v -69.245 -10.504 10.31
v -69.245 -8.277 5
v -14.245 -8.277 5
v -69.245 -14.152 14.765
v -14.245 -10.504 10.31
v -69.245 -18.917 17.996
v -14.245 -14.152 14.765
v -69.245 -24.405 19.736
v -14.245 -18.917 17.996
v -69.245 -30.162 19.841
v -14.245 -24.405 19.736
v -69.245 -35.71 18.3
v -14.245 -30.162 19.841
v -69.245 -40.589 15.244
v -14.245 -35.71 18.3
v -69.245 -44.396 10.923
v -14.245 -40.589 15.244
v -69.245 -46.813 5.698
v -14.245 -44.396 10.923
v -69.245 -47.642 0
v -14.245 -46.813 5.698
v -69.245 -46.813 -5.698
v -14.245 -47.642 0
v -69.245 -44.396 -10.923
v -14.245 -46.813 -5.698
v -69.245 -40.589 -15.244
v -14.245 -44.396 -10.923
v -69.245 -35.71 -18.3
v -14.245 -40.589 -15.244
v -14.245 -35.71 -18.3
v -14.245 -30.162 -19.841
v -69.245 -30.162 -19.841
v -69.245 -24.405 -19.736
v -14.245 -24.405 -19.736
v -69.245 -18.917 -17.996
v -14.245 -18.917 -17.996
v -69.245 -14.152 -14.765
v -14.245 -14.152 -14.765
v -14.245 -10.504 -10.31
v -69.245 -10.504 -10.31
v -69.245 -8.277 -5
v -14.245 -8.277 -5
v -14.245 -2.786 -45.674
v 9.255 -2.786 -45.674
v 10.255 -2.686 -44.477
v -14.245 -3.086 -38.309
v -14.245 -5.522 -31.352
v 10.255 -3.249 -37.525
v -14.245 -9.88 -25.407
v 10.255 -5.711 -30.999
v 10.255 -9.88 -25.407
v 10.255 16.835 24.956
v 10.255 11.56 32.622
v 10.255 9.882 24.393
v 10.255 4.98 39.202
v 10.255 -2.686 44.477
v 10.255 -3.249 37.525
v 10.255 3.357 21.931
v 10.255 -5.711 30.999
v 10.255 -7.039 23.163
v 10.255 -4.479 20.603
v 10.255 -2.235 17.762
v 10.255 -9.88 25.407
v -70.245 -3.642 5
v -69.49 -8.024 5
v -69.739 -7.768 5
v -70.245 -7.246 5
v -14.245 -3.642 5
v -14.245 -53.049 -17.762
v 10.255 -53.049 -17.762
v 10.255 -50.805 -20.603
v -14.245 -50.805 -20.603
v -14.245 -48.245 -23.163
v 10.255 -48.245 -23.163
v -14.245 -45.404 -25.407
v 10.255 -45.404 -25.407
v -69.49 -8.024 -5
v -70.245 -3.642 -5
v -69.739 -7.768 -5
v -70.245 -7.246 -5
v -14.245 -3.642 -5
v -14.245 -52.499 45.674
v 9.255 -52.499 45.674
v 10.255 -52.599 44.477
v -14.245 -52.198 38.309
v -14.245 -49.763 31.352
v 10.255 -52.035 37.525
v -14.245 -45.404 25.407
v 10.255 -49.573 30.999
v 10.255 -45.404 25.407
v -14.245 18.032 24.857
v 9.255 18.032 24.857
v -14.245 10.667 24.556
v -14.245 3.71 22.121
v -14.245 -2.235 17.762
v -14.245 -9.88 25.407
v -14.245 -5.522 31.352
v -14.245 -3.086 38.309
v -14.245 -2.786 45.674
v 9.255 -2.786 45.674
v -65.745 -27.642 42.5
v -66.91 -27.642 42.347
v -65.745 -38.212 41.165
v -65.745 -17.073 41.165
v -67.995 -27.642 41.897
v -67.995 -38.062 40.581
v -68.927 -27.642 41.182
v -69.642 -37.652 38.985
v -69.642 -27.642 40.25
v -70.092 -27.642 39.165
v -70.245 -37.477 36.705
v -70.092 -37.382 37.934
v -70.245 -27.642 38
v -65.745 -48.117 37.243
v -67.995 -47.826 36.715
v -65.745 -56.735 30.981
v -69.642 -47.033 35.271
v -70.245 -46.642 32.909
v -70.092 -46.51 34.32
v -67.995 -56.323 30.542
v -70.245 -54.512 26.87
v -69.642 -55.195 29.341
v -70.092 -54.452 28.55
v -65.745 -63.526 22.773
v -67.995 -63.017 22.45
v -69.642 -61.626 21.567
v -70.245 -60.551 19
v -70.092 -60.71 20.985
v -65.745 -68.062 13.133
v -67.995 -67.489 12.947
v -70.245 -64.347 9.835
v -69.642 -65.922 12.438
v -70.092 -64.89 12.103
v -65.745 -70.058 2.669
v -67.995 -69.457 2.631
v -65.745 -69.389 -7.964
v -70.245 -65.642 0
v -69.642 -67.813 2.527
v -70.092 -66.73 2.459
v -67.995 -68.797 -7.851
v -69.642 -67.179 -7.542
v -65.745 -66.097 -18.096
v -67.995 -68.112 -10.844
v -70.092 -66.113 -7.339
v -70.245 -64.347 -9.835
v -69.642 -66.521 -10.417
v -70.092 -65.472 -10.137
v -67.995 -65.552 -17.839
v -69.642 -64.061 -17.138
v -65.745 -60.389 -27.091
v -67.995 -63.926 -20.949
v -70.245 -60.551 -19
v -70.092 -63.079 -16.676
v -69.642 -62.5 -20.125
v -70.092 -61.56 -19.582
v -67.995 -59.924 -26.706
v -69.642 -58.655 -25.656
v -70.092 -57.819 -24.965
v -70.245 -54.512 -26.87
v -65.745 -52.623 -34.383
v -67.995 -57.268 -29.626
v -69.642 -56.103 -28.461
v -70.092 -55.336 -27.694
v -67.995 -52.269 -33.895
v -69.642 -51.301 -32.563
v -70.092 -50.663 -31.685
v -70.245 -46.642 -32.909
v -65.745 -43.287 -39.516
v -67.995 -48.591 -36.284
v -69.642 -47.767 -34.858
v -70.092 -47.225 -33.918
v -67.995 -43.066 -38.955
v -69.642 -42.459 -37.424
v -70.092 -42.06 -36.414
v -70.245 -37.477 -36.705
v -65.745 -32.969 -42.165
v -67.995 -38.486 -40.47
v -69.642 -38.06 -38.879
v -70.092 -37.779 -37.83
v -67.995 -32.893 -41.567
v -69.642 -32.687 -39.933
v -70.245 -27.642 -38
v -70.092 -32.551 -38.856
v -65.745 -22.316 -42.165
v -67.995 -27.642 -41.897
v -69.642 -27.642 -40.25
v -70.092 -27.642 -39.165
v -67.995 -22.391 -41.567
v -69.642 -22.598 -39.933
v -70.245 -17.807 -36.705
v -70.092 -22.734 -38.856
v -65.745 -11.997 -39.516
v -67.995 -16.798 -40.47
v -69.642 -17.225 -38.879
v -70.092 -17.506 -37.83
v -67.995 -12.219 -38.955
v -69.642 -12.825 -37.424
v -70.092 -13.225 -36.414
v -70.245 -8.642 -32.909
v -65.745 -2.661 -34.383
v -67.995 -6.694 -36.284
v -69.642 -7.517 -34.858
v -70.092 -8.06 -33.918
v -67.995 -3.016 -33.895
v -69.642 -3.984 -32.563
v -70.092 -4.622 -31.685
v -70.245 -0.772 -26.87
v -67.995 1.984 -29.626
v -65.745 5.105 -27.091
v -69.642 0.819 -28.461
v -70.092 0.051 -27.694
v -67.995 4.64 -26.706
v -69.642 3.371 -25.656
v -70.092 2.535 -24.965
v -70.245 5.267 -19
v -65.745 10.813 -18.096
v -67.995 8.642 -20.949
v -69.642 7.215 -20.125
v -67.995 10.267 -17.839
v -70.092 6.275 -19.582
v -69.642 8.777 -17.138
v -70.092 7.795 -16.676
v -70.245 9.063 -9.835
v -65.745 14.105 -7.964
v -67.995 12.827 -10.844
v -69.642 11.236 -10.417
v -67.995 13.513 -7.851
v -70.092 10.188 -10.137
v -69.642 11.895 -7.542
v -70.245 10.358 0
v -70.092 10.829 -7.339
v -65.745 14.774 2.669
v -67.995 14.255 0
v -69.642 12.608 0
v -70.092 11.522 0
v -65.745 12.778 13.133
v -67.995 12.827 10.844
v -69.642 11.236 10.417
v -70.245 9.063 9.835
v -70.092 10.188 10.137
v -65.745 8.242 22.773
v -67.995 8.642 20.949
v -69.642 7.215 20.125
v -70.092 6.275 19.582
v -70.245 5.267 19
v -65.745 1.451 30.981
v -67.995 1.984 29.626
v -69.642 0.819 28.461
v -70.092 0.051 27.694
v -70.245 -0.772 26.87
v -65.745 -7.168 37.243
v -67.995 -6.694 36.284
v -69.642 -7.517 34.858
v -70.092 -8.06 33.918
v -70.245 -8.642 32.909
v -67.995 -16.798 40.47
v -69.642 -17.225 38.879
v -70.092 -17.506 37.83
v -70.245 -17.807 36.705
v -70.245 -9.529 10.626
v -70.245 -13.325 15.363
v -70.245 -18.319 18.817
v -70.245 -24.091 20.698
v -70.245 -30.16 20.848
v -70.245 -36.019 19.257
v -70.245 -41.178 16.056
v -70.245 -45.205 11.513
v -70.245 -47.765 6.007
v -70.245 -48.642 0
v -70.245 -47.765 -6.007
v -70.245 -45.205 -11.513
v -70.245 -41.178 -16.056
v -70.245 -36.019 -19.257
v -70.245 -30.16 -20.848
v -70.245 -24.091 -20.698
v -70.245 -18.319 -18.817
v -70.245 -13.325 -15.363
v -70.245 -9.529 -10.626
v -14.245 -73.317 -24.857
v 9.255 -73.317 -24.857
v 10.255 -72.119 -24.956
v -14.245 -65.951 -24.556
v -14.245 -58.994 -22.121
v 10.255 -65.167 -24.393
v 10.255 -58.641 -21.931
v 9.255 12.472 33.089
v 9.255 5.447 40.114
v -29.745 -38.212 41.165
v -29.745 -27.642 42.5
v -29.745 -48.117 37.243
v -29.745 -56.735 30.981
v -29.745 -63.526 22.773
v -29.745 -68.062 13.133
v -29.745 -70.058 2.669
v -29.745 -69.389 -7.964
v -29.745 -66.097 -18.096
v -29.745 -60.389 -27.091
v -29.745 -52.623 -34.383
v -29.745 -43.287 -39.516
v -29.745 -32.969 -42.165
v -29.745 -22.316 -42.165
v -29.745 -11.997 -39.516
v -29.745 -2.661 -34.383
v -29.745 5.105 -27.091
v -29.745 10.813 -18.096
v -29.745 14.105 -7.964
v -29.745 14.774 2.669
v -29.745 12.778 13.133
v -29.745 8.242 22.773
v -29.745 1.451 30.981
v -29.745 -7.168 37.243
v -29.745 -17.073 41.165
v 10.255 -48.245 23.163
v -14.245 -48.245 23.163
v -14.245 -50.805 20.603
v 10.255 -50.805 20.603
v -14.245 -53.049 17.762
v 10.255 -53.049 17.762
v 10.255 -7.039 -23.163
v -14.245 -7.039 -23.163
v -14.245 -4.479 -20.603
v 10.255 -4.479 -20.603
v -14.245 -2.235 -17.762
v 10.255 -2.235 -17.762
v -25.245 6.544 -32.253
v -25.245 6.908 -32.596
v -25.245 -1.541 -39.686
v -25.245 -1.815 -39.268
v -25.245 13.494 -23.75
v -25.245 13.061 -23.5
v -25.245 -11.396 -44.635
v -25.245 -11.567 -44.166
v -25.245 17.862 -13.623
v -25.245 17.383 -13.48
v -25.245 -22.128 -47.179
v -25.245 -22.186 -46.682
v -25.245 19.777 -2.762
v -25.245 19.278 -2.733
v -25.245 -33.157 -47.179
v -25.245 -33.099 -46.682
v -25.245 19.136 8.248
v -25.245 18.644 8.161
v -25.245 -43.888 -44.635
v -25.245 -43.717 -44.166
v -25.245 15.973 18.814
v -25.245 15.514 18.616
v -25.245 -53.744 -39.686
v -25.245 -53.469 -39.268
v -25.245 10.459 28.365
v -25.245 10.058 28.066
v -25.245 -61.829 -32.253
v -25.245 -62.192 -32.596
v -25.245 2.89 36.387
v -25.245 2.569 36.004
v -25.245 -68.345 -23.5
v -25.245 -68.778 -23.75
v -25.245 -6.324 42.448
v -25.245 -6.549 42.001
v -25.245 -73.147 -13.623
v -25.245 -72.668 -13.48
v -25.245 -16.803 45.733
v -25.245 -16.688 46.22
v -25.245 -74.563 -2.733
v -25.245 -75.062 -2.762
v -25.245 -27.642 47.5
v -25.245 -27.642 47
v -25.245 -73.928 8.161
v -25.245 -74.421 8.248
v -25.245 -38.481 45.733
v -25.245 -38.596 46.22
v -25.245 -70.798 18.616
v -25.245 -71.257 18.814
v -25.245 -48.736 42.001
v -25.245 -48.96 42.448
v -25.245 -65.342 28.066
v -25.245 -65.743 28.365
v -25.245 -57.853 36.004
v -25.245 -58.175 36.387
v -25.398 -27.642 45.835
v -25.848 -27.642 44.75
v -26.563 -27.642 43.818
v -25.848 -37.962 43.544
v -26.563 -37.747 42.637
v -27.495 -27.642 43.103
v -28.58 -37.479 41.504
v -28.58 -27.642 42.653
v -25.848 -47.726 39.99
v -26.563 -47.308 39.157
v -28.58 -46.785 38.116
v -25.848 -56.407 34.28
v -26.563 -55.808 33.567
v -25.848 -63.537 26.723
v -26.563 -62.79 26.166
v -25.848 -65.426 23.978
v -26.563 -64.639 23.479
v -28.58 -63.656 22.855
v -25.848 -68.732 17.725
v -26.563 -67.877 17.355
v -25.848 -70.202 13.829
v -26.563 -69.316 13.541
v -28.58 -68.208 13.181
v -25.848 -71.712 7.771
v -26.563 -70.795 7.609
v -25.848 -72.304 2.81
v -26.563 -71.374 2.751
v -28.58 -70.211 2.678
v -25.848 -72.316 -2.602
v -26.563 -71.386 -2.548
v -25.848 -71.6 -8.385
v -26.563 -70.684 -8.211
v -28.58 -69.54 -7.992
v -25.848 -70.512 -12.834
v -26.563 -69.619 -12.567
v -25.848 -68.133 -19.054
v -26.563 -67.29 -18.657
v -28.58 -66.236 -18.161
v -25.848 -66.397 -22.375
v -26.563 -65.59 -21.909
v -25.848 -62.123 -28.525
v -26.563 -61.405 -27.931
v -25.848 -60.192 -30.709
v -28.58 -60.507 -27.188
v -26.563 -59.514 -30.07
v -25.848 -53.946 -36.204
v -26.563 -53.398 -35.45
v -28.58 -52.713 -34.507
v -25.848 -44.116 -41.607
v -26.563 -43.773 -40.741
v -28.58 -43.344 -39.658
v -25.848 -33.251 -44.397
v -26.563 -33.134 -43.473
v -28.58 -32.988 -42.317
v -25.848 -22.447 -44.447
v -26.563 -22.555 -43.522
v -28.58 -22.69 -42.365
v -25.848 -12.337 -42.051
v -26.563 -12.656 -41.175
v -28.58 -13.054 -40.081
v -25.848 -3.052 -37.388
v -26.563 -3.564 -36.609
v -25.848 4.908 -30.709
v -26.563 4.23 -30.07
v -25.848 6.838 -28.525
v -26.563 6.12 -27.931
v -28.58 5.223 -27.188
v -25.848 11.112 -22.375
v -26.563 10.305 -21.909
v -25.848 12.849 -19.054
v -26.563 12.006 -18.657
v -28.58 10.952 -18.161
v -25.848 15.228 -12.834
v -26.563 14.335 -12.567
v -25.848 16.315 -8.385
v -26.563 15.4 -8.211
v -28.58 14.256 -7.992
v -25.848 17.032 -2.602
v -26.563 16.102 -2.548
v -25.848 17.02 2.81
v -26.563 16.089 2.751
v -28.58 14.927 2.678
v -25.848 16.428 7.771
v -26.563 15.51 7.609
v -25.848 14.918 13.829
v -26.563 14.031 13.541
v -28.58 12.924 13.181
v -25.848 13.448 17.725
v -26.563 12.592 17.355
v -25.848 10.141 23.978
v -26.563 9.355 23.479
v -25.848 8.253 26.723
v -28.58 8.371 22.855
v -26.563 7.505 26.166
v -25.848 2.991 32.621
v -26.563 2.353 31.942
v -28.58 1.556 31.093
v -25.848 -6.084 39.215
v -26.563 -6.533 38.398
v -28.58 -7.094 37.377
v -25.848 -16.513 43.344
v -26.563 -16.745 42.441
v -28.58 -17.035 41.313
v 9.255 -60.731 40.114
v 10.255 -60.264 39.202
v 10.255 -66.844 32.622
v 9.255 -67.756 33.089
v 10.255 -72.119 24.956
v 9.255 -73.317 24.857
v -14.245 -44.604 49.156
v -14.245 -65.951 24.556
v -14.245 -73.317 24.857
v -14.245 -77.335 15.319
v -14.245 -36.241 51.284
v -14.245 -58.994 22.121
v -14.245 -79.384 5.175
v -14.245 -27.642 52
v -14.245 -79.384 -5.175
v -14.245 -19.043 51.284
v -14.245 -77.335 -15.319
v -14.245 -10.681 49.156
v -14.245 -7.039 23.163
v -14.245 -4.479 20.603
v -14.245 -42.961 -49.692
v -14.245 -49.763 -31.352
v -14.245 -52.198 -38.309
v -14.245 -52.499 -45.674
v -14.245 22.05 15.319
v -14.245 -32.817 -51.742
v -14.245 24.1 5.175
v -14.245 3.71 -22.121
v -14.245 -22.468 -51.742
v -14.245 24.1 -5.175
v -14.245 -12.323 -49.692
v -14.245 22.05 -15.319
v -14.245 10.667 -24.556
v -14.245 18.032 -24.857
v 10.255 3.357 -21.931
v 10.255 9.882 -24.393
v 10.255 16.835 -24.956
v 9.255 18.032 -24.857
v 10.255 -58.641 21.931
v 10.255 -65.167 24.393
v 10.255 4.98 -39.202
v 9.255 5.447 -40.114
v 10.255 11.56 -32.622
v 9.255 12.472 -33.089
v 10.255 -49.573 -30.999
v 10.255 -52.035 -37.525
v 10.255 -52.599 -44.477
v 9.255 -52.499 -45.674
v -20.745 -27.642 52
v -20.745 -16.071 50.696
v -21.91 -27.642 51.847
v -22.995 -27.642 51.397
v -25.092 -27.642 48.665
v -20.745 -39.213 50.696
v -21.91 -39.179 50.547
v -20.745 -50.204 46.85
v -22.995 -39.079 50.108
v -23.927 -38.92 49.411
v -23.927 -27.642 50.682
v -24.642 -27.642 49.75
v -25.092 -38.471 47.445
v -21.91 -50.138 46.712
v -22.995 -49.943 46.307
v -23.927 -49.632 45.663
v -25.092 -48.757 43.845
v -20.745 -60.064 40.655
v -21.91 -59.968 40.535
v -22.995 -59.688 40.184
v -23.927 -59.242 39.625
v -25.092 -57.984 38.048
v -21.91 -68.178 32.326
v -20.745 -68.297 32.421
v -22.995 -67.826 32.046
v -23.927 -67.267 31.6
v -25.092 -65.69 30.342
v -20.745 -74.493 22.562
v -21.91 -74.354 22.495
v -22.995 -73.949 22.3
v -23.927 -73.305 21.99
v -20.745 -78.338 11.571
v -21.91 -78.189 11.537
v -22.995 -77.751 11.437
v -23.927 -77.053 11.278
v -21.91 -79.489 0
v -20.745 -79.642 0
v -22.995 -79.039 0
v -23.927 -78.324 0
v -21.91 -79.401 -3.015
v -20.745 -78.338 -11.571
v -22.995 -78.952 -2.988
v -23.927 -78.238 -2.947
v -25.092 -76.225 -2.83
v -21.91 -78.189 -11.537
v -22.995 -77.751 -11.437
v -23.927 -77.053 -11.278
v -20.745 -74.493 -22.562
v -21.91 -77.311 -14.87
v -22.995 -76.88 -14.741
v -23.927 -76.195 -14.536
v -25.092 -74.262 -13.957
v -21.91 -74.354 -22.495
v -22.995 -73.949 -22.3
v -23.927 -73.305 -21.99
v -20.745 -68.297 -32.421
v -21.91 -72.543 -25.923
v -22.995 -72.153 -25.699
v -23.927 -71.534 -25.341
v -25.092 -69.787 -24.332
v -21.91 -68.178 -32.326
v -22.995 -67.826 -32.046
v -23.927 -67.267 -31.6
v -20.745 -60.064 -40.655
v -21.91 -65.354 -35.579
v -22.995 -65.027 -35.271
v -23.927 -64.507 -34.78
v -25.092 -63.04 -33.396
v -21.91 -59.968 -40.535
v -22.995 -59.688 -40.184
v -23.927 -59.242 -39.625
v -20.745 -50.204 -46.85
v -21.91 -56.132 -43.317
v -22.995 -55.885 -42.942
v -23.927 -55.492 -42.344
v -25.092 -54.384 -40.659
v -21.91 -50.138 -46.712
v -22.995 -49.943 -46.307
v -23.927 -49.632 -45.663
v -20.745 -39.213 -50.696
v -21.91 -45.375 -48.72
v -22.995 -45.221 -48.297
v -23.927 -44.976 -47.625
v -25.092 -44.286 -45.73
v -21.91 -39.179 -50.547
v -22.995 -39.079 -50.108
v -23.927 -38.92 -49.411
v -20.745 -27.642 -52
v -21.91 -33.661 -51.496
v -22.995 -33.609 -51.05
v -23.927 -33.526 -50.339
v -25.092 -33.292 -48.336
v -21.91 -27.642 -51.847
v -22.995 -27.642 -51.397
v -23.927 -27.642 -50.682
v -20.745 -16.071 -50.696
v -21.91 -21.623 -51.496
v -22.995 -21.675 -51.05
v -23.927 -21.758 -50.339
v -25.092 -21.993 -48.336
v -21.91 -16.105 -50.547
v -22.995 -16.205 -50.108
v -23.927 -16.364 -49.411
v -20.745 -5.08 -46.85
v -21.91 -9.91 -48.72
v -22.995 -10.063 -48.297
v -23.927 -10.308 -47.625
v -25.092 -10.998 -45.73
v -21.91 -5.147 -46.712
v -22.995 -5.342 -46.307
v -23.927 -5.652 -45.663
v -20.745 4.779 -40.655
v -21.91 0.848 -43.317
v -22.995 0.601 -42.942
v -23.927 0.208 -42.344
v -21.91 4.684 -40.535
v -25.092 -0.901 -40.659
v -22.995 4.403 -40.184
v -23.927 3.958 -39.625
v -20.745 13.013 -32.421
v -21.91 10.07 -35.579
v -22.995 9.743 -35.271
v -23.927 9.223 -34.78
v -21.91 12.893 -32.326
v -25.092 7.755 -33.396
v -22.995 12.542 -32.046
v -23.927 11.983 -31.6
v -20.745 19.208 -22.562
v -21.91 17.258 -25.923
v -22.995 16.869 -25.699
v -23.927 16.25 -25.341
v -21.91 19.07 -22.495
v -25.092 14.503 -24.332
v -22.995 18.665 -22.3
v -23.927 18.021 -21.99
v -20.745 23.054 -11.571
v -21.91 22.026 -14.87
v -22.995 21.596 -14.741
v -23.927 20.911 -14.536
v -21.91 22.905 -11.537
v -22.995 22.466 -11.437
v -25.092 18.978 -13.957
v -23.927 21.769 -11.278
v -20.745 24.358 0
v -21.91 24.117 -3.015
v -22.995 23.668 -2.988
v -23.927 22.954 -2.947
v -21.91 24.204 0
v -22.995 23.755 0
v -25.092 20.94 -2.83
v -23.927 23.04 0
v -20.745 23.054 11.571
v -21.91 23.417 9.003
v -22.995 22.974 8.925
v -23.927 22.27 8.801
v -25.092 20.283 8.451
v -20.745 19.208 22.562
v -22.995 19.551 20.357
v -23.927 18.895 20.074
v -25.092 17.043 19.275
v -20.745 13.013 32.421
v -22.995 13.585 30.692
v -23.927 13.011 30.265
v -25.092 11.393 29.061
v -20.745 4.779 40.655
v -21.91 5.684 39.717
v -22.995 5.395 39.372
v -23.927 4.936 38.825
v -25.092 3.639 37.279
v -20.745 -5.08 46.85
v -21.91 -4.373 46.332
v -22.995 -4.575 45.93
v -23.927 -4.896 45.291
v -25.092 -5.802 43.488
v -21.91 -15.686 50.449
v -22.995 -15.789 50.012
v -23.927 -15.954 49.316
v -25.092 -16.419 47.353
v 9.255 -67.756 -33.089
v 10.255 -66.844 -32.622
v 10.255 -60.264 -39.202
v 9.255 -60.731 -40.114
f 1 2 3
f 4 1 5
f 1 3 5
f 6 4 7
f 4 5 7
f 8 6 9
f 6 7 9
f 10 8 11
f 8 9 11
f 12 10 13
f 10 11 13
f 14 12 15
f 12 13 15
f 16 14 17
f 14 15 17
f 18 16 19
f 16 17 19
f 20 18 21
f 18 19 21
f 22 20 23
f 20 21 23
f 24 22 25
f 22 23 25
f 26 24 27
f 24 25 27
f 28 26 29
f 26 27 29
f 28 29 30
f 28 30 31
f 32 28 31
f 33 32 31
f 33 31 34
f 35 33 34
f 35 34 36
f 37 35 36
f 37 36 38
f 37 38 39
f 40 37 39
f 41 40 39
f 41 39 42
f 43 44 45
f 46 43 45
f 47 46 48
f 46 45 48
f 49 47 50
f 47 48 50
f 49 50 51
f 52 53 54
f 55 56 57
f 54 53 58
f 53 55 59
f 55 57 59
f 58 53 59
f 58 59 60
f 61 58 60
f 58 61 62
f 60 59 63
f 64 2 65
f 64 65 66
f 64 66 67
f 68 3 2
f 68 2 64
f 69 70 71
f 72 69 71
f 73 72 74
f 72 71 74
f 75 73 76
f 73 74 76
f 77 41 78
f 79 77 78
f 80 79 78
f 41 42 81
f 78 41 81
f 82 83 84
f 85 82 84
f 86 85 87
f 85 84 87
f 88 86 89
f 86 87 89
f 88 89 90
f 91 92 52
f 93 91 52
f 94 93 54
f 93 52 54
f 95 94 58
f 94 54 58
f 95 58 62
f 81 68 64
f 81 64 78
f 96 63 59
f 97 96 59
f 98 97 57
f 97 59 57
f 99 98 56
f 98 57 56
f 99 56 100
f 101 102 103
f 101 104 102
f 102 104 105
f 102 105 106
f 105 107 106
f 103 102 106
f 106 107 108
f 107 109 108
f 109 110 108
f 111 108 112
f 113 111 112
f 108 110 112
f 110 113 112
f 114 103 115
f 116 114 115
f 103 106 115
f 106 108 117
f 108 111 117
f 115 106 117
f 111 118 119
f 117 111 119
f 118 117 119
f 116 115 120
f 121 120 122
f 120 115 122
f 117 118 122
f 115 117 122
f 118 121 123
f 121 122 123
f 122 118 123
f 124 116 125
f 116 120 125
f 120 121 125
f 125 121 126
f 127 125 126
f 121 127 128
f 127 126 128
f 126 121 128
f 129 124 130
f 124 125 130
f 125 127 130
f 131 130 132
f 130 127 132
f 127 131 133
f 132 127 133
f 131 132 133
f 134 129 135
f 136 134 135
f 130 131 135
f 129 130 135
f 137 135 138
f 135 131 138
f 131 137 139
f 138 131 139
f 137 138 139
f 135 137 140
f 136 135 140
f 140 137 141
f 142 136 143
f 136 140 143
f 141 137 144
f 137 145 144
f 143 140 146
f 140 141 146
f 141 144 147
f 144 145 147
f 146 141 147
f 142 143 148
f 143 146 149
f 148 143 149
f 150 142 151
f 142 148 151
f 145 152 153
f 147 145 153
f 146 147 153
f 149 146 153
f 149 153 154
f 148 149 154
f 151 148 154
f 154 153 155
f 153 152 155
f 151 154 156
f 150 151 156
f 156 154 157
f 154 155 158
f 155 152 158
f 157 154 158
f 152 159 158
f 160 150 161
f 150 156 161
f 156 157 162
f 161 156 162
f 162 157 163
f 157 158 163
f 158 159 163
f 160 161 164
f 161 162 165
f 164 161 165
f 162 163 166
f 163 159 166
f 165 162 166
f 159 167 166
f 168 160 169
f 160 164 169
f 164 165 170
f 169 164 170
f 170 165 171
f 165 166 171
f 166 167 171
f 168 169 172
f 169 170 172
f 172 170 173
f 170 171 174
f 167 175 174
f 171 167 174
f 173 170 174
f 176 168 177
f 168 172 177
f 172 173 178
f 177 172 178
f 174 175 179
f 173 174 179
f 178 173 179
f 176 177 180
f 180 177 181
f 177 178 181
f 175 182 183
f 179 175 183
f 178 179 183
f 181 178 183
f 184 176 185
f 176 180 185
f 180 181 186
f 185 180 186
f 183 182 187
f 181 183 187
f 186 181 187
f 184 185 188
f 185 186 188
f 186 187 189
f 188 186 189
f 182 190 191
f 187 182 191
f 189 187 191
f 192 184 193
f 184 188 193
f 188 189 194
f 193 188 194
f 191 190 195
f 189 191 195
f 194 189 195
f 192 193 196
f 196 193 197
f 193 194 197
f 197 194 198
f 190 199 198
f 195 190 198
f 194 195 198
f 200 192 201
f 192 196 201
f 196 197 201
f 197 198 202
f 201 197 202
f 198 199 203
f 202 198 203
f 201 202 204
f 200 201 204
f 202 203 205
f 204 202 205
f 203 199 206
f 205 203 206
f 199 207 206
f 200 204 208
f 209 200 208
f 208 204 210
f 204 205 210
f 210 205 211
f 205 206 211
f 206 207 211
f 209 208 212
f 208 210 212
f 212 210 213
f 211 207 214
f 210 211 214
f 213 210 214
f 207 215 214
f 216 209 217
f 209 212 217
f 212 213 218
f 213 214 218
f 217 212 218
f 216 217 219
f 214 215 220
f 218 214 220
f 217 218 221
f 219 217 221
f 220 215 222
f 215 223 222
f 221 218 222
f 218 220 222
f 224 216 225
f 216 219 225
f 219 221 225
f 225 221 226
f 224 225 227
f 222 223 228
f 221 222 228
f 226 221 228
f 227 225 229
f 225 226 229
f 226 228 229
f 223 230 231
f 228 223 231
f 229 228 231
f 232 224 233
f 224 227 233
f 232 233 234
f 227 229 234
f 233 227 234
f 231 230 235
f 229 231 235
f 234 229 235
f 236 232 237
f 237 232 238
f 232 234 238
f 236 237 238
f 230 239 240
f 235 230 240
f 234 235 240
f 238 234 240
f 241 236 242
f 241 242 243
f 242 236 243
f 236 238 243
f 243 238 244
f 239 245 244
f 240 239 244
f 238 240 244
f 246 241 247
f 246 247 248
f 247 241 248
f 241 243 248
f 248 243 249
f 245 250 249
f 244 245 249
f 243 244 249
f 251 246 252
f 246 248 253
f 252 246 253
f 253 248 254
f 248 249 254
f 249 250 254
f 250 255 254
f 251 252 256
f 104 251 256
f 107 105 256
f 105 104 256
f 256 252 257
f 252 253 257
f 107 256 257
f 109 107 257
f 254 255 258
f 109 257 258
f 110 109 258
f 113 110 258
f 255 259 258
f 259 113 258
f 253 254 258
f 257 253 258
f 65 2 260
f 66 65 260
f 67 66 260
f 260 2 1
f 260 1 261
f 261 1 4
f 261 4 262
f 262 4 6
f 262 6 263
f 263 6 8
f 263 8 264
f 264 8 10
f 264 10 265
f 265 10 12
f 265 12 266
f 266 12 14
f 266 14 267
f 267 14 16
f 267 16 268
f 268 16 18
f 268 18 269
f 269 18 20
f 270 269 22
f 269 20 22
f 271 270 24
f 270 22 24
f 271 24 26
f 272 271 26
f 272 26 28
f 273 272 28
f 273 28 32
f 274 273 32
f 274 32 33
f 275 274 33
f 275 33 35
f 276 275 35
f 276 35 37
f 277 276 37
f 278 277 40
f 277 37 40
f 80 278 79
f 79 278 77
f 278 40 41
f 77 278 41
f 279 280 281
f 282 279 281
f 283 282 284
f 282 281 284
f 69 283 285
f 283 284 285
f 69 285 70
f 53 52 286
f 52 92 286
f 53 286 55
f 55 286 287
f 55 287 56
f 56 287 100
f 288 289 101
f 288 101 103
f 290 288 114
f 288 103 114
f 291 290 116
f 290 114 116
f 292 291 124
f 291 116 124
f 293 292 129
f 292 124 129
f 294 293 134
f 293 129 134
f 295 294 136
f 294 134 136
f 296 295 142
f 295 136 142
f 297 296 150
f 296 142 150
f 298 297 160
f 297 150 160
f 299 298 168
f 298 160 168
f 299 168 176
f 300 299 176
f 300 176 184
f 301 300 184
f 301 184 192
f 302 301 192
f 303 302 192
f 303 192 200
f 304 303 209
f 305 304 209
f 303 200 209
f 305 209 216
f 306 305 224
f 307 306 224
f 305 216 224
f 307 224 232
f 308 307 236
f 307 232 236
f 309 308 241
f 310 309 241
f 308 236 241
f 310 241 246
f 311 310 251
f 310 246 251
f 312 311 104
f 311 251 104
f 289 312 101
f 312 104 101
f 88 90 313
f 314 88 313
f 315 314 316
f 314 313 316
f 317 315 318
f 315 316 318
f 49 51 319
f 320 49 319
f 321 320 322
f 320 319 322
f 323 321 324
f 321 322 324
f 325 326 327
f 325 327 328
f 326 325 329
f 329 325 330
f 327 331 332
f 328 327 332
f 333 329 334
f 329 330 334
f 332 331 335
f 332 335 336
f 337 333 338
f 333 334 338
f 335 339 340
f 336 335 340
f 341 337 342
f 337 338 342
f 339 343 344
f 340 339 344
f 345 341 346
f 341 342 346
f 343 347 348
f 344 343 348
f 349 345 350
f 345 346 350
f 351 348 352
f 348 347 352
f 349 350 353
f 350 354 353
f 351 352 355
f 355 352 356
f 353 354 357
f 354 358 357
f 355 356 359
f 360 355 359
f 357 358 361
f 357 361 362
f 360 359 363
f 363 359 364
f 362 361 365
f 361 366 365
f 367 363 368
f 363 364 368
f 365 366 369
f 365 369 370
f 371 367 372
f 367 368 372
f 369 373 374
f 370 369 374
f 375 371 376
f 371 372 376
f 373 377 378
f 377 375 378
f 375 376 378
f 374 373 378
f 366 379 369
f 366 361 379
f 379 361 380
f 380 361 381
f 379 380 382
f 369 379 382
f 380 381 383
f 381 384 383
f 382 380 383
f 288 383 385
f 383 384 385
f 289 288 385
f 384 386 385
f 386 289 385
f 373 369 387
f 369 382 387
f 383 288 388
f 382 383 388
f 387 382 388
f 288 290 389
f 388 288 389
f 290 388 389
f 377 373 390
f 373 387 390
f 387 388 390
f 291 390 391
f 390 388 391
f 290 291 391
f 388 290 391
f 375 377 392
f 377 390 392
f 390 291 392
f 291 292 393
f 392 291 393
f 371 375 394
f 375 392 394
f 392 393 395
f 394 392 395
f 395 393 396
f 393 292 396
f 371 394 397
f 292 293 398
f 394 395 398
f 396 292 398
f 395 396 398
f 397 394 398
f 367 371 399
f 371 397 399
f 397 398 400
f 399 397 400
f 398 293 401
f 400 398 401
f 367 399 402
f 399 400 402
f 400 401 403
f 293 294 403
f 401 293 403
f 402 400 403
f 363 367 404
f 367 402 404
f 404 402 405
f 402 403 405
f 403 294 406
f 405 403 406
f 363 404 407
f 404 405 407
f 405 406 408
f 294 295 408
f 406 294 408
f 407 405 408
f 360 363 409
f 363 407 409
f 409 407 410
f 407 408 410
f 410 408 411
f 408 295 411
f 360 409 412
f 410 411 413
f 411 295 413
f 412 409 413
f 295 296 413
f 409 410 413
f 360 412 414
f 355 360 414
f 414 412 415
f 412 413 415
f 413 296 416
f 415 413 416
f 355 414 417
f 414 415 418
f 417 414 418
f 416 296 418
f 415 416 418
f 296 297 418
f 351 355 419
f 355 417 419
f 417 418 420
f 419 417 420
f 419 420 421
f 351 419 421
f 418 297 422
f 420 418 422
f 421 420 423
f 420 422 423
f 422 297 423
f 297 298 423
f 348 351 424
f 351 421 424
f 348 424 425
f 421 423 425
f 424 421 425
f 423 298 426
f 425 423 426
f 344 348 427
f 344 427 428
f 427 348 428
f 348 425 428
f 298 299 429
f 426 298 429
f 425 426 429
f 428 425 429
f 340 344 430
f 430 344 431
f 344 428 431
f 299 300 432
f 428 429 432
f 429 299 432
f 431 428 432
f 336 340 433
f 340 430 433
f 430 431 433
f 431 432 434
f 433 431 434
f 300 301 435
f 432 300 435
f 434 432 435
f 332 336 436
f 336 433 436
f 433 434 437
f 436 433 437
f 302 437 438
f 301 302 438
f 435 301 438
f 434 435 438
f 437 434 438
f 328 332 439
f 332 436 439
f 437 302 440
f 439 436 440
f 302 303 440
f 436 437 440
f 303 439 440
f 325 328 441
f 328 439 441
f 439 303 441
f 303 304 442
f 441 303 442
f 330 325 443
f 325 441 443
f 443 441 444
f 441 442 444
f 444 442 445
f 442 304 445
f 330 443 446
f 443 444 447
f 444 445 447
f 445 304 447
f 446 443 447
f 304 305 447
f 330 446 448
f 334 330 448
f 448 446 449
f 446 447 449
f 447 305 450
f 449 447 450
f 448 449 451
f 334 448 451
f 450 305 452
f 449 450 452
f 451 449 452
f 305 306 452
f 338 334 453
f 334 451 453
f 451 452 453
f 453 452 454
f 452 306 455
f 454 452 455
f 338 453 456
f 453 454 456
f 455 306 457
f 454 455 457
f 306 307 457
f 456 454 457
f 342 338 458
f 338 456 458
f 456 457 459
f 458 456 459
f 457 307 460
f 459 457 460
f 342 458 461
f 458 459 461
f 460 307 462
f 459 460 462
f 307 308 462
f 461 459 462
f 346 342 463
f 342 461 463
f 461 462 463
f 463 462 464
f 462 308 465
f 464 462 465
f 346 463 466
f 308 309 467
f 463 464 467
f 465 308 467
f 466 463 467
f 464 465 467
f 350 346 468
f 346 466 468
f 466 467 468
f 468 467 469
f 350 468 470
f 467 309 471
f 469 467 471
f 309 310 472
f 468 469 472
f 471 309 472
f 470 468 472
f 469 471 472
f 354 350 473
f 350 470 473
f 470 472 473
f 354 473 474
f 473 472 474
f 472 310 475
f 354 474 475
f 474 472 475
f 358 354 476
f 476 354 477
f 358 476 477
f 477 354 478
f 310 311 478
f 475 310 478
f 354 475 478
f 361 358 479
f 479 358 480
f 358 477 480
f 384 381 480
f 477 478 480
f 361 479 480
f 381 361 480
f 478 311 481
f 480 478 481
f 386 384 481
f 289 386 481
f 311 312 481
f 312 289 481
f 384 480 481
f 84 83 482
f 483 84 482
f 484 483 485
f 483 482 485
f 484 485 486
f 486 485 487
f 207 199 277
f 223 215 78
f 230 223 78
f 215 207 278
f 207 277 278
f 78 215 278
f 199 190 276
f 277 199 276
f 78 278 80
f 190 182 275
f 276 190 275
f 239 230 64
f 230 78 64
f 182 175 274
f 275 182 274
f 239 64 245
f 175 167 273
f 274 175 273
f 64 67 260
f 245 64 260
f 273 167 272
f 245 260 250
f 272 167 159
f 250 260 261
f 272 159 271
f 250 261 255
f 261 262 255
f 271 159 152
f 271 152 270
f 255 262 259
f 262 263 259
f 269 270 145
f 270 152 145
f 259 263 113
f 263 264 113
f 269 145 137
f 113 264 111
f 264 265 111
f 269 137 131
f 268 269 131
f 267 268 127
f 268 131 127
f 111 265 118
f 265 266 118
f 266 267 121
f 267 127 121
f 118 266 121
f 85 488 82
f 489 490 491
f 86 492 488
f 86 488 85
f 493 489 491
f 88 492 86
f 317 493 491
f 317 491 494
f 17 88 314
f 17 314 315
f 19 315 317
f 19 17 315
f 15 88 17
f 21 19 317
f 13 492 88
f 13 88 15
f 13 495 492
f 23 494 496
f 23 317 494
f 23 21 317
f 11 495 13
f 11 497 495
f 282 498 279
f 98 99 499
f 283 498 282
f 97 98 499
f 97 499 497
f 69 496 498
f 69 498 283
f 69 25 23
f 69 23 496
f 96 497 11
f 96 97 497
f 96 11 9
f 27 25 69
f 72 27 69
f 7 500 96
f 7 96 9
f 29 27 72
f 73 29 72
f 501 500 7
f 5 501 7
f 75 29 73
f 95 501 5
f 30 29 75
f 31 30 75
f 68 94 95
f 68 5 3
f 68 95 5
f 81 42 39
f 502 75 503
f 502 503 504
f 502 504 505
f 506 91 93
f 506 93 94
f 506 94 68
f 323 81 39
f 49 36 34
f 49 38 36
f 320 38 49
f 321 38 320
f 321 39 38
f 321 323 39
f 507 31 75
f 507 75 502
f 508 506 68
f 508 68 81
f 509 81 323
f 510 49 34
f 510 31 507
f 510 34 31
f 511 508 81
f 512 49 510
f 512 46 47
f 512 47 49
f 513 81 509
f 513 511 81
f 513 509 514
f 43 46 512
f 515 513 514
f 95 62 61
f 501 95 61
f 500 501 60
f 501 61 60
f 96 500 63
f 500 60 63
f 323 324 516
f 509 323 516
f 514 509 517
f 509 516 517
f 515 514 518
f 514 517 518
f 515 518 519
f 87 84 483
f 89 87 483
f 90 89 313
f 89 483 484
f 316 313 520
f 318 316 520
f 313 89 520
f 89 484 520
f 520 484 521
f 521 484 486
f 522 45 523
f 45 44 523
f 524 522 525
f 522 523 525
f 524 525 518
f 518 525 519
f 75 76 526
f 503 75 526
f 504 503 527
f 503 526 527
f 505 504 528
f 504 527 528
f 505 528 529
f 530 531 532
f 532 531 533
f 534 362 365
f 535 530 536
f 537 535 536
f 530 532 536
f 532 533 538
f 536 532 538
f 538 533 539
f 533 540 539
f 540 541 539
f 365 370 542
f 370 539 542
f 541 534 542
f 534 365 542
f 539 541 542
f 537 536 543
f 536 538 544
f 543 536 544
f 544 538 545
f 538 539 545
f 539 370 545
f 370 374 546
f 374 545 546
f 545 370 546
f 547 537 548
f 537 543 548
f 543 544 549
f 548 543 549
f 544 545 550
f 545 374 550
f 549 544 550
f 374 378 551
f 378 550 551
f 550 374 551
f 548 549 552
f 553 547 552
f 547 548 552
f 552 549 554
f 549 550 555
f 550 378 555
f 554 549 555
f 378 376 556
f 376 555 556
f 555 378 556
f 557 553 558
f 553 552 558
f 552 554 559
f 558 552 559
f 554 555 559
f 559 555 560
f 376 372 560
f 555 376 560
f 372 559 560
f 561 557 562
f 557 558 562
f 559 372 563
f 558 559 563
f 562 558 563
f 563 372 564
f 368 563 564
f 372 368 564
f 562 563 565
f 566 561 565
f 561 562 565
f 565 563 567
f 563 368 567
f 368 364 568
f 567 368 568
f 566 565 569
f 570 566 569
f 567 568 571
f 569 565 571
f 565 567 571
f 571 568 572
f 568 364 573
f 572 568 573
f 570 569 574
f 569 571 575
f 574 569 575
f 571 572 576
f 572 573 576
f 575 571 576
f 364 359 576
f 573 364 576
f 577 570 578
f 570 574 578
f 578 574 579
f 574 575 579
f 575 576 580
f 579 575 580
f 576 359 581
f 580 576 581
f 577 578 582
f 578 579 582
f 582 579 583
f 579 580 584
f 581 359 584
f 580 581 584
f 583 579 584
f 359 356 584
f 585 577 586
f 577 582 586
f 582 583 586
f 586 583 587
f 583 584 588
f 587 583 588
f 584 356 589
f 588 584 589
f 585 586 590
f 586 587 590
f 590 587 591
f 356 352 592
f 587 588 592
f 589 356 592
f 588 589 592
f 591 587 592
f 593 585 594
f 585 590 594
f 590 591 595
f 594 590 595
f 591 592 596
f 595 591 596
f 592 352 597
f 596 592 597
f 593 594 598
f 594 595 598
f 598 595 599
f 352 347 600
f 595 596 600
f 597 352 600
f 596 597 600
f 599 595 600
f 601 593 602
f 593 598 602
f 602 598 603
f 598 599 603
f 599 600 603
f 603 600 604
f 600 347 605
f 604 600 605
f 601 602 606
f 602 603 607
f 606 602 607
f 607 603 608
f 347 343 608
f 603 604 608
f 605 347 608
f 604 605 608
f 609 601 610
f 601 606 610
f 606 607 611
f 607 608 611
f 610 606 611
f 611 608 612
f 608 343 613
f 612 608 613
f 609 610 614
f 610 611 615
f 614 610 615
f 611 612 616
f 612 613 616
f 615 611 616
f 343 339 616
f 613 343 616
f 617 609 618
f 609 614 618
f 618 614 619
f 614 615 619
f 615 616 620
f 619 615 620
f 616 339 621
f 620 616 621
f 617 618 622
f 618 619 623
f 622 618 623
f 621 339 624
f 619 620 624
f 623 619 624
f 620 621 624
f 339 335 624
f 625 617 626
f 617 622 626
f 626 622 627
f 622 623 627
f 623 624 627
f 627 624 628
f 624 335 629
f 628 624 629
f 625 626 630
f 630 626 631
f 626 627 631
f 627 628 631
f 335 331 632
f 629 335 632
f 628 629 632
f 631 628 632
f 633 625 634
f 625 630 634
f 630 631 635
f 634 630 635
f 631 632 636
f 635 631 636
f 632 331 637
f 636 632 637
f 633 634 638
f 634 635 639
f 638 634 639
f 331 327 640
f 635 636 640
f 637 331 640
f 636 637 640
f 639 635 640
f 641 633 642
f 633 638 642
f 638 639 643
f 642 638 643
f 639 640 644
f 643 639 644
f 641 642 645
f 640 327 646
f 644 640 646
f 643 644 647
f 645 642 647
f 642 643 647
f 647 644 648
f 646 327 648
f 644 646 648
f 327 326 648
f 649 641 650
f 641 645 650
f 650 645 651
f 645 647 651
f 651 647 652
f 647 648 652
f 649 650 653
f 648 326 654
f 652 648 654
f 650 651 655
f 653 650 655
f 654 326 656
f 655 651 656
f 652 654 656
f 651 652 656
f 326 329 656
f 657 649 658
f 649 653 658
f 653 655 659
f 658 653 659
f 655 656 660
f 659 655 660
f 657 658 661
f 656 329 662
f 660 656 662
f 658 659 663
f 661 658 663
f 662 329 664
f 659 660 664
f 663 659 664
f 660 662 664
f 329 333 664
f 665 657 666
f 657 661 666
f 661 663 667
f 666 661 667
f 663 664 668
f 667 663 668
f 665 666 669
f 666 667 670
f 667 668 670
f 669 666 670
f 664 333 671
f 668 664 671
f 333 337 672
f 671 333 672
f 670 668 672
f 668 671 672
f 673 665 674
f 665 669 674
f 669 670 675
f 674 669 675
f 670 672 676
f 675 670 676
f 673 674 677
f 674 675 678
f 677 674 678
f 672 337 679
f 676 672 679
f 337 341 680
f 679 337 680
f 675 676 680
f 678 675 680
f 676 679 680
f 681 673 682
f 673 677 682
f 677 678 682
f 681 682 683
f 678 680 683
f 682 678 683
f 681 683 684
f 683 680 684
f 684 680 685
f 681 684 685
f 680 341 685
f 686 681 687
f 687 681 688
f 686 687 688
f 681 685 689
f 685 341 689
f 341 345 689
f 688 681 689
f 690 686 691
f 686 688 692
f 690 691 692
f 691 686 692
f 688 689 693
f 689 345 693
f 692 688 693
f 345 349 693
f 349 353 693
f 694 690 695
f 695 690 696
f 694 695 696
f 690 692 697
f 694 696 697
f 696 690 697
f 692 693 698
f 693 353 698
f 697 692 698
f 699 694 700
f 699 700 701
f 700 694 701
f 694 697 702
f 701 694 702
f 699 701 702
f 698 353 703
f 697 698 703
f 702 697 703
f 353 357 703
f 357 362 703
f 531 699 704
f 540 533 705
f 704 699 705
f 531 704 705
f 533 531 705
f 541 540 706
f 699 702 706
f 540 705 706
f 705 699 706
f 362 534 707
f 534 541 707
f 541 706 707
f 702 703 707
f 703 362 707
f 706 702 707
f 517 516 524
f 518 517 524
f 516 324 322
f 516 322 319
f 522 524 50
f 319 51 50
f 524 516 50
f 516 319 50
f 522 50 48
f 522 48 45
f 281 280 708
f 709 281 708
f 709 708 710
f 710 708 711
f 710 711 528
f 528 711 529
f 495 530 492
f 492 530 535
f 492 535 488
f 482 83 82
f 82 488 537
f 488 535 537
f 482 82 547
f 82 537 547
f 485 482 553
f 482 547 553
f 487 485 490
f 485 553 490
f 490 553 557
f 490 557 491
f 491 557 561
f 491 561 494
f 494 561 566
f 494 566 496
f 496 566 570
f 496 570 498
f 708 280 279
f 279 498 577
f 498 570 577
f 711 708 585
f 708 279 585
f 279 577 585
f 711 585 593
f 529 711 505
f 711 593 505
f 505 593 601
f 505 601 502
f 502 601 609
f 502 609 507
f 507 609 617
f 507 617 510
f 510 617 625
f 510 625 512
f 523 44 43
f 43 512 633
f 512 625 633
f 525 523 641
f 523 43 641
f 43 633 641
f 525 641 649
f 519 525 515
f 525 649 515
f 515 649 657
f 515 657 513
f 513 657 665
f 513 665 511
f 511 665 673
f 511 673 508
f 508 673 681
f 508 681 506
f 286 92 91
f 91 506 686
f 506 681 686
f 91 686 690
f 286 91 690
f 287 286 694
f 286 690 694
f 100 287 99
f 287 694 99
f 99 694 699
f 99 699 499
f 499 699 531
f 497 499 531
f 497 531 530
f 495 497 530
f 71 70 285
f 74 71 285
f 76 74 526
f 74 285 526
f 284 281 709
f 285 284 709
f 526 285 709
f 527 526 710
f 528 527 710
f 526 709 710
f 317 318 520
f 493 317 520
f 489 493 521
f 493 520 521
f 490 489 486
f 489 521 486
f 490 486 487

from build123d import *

# Parameters (mm, degrees)
CUT_EXTRUDE_1_DEPTH = 24.5
SKETCH_4_W          = 10
SKETCH_4_H          = 10.423116616
CUT_EXTRUDE_2_DEPTH = 111.376079444


with BuildPart() as part:
    # Эскиз1 → Повернуть1 (revolve)
    with BuildSketch(Plane.XY, mode=Mode.PRIVATE) as revolve_1_sk:
        with BuildLine():
            Line((-70.245087719, -6.642192982), (-69.245087719, -7.642192982))
            Line((-69.245087719, -7.642192982), (9.254912281, -7.642192982))
            Line((9.254912281, -7.642192982), (10.254912281, -6.642192982))
            Line((10.254912281, -6.642192982), (10.254912281, 23.357807018))
            Line((10.254912281, 23.357807018), (9.254912281, 24.357807018))
            Line((9.254912281, 24.357807018), (-20.745087719, 24.357807018))
            ThreePointArc((-20.745087719, 24.357807018), (-23.927068235, 23.039787533), (-25.245087719, 19.857807018))
            Line((-25.245087719, 19.857807018), (-25.245087719, 19.357807018))
            ThreePointArc((-25.245087719, 19.357807018), (-26.563107204, 16.175826502), (-29.745087719, 14.857807018))
            Line((-29.745087719, 14.857807018), (-65.745087719, 14.857807018))
            ThreePointArc((-65.745087719, 14.857807018), (-68.927068235, 13.539787533), (-70.245087719, 10.357807018))
            Line((-70.245087719, 10.357807018), (-70.245087719, -6.642192982))
        make_face()
    revolve(revolve_1_sk.sketch.rotate(Axis((-70.245087719, -27.642192982, 0), (1, 0, 0)), 90), axis=Axis((-70.245087719, -27.642192982, 0), (1, 0, 0)))

    # Эскиз3 → Вырез-Вытянуть1 (cut)
    with BuildSketch(Plane(origin=(10.254912281, 0, 0), x_dir=(0, 0, -1), z_dir=(1, 0, 0))):
        with BuildLine():
            ThreePointArc((-17.761912417, -53.049169727), (0, -95.642192982), (17.761912417, -53.049169727))
            ThreePointArc((17.761912417, -53.049169727), (21.920310217, -49.562503199), (25.406976744, -45.4041054))
            ThreePointArc((25.406976744, -45.4041054), (68, -27.642192982), (25.406976744, -9.880280565))
            ThreePointArc((25.406976744, -9.880280565), (21.920310217, -5.721882766), (17.761912417, -2.235216238))
            ThreePointArc((17.761912417, -2.235216238), (0, 40.357807018), (-17.761912417, -2.235216238))
            ThreePointArc((-17.761912417, -2.235216238), (-21.920310217, -5.721882766), (-25.406976744, -9.880280565))
            ThreePointArc((-25.406976744, -9.880280565), (-68, -27.642192982), (-25.406976744, -45.4041054))
            ThreePointArc((-25.406976744, -45.4041054), (-21.920310217, -49.562503199), (-17.761912417, -53.049169727))
        make_face()
    extrude(amount=-CUT_EXTRUDE_1_DEPTH, mode=Mode.SUBTRACT)

    # Эскиз4 → Вырез-Вытянуть2 (cut, through all)
    with BuildSketch(Plane(origin=(-14.245087719, 0, 0), x_dir=(0, 0, -1), z_dir=(1, 0, 0))):
        with Locations((0, -8.85375129)):
            Rectangle(SKETCH_4_W, SKETCH_4_H)
    extrude(amount=-CUT_EXTRUDE_2_DEPTH, mode=Mode.SUBTRACT)


solid = part.part
